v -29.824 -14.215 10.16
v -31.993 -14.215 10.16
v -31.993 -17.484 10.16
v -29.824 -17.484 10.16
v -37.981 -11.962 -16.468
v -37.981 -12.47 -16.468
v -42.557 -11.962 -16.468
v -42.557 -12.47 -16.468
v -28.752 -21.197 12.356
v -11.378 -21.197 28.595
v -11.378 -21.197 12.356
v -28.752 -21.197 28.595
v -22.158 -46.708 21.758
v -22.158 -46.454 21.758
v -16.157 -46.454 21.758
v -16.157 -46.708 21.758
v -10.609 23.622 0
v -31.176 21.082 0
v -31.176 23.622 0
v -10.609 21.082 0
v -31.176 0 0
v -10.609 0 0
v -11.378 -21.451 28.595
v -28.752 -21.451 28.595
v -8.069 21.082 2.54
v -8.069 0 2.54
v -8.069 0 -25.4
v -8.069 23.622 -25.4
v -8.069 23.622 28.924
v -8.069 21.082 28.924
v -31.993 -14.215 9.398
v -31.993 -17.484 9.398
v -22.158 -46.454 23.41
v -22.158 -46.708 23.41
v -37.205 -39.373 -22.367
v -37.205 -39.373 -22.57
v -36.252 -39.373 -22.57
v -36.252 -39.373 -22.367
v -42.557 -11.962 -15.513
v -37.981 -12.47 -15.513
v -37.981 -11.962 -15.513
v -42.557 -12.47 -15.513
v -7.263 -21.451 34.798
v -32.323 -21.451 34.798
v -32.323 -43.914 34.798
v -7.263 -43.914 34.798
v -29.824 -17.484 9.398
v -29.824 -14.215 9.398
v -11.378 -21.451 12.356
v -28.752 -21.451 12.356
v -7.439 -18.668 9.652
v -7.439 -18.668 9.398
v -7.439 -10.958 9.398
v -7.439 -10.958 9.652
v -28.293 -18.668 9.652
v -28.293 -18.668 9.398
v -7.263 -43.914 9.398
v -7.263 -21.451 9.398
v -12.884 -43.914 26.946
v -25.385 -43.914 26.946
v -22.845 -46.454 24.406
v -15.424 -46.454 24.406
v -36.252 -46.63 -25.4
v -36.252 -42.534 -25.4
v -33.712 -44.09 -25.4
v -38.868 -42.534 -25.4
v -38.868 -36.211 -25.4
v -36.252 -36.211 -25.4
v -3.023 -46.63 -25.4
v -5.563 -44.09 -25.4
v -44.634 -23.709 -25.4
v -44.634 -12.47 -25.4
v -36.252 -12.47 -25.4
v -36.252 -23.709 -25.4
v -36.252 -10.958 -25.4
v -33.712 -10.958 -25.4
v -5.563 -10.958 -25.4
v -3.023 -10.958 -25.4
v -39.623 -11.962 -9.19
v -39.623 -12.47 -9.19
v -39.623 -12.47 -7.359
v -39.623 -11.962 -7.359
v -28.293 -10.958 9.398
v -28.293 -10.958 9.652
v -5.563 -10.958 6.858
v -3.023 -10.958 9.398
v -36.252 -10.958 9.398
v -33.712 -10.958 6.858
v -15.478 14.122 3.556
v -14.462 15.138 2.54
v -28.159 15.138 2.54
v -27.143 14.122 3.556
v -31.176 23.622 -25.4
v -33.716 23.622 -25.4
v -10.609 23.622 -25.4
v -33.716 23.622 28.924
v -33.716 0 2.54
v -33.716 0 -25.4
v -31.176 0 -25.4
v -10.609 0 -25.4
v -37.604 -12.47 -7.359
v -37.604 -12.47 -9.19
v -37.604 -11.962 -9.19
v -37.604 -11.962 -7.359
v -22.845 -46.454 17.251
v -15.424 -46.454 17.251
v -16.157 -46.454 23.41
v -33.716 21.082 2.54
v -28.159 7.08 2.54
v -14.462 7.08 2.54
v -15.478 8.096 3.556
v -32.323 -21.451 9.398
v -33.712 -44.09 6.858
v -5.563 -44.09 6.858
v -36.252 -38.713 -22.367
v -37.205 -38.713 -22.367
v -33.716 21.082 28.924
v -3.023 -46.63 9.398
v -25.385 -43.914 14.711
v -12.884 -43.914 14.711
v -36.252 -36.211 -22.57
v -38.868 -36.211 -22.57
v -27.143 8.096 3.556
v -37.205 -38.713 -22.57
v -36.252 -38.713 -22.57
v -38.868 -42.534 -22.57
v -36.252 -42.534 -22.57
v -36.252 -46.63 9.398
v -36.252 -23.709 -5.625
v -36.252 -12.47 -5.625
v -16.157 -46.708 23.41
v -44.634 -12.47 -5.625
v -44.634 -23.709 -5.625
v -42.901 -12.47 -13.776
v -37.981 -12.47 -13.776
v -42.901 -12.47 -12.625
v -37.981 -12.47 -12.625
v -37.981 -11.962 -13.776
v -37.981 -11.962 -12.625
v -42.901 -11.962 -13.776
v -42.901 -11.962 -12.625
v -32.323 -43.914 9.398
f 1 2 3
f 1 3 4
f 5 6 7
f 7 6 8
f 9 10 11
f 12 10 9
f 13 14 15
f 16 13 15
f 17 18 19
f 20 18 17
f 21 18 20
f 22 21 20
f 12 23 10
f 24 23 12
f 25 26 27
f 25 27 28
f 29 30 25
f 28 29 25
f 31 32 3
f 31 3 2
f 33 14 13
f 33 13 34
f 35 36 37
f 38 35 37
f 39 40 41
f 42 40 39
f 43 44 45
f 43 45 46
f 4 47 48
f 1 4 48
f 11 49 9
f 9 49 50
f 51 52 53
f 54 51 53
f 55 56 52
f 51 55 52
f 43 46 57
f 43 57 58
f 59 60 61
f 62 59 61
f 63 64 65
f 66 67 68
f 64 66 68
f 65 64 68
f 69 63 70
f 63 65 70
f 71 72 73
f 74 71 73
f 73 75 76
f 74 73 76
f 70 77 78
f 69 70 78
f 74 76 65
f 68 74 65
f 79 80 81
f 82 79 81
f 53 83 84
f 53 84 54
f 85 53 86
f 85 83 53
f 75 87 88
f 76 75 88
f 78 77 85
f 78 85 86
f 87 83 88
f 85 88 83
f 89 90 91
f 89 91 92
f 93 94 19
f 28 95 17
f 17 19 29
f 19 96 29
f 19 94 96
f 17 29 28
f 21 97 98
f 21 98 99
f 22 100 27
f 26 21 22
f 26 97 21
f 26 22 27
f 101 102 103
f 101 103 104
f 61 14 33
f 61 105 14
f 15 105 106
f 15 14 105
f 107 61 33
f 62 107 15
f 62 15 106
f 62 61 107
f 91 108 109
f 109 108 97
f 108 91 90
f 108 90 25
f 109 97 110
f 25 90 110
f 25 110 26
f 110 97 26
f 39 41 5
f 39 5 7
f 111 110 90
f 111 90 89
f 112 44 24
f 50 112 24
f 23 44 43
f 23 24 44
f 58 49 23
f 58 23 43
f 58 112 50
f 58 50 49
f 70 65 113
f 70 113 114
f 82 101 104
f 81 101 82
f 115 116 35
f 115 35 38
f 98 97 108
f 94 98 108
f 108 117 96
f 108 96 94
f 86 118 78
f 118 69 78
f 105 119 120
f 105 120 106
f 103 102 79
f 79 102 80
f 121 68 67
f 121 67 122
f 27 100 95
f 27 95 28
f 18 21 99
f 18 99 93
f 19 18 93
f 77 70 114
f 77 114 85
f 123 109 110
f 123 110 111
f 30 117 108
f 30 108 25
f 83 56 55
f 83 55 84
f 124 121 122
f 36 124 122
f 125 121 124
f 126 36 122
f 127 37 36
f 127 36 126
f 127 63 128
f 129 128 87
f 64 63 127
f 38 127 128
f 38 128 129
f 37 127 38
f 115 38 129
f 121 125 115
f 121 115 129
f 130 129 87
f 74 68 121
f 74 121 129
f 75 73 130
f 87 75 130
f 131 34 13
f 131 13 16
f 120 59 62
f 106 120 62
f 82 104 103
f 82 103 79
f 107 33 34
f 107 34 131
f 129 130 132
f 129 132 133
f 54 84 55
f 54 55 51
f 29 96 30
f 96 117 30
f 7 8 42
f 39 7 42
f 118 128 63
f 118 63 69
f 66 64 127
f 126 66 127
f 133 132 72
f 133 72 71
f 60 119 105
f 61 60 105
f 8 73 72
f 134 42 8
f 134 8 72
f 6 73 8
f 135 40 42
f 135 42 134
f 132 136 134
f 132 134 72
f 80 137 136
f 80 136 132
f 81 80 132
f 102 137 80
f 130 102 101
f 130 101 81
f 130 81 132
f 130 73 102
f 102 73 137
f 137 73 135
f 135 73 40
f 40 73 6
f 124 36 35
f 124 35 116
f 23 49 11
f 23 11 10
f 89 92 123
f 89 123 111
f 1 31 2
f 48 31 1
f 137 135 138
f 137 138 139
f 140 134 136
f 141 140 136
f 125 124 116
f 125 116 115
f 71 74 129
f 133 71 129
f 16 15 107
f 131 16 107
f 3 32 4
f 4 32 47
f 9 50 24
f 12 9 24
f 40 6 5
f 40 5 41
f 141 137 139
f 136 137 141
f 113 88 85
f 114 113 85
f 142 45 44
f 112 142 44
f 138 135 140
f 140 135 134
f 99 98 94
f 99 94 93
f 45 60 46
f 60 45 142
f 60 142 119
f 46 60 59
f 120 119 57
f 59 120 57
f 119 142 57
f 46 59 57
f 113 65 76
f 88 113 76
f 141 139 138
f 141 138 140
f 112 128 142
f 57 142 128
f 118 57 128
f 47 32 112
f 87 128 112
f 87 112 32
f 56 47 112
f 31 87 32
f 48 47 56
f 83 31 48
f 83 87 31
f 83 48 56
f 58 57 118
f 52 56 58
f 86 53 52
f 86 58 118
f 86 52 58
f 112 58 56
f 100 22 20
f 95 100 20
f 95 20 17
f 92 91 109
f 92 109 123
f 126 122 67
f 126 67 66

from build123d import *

# Parameters (mm, degrees)
F0_W          = 25.6471270695
F0_H          = 28.9241932333
F1_DEPTH      = 23.622
F2_T          = -2.54
F3_DEPTH      = 25.4
F4_T          = 2.54
F4_T3_DEPTH   = 30.7271270695
F5_W          = 33.229653025
F5_H          = 35.672545433
F6_DEPTH      = 25.4
F7_DEPTH      = 9.398
F8_T          = -2.54
F9_W          = 25.0606182963
F9_H          = 22.4626017734
F10_DEPTH     = 25.4
F11_W         = 17.3738580197
F11_H         = 16.2390768528
F12_DEPTH     = 0.254
F13_W         = 20.8540516905
F13_H         = 7.7100452036
F14_DEPTH     = 0.254
F15_W         = 17.5806907937
F15_H         = 17.3154473305
F16_DEPTH     = 2.54
F17_T4_DEPTH  = 43.7089899514
F17_T9_DEPTH  = 30.3795969093
F17_T14_DEPTH = 43.7089899514
F17_T19_DEPTH = 30.3795969093
F18_W         = 6.000591442
F18_H         = 1.6524102539
F19_DEPTH     = 0.254
F20_W         = 2.1683480591
F20_H         = 3.2685222104
F21_DEPTH     = 0.762
F22_W         = 21.8256991357
F22_H         = 16.1863591056
F23_DEPTH     = 1.016
F24_W         = 11.2391430885
F24_H         = 19.774777656
F25_DEPTH     = 8.382
F26_W         = 2.0196139812
F26_H         = 1.8313727342
F27_DEPTH     = 0.508
F28_W         = 4.9204975367
F28_H         = 1.1510411277
F29_DEPTH     = 0.508
F30_W         = 4.5765712857
F30_H         = 0.9553717311
F31_DEPTH     = 0.508
F32_W         = 6.3235126436
F32_H         = 2.8299971759
F33_DEPTH     = 2.6162
F34_W         = 0.9528808296
F34_H         = 0.6592851132
F35_DEPTH     = 0.2032
F36_T4_DEPTH  = 47.9539982934
F36_T9_DEPTH  = 29.2505086845
F36_T14_DEPTH = 47.9539982934
F36_T19_DEPTH = 29.2505086845
F37_W         = 0.83655864
F37_H         = 0.8337534964
F38_DEPTH     = 0.508
F37_W_2       = 0.7356256247
F37_H_2       = 0.5238540471
F37_W_3       = 1.1432357132
F37_H_3       = 0.6819479167
F37_W_4       = 0.7289908826
F37_H_4       = 0.5421712995
F37_W_5       = 1.2829229236
F37_H_5       = 0.4794821143
F37_W_6       = 0.6956644356
F37_H_6       = 0.5608797073
F37_W_7       = 1.0760016739
F37_H_7       = 0.4885531962
F37_W_8       = 0.6218552589
F37_H_8       = 0.4100985825
F37_W_9       = 0.7822141051
F37_H_9       = 0.4685148597
F37_W_10      = 1.0629147291
F37_H_10      = 0.598076731
F37_W_11      = 1.1558197439
F37_H_11      = 0.371992588
F37_W_12      = 0.8621029556
F37_H_12      = 0.3762468696
F37_W_13      = 0.7478930056
F37_H_13      = 0.5268156528
F37_W_14      = 1.0761059821
F37_H_14      = 0.5310699344


# Not quite as in the source:
# - a fillet or chamfer that OpenCascade refuses, or shapes differently, is made with other operations: its cross-section is extruded or revolved along the edge and cut away or added
# - a shell that OpenCascade refuses in one call is made with other operations: the cavity is built on its own and cut out


with BuildPart() as f1:
    # F0 (on Front) → F1 (new body)
    with BuildSketch(Plane.XZ):
        with Locations((-20.8924110048, 14.4620966166)):
            Rectangle(F0_W, F0_H)
    extrude(amount=-F1_DEPTH)

    # F2
    f2_openings = [f1.faces().sort_by_distance(p)[0] for p in [
        (-33.715975, 11.811, 14.462097),
        (-20.892411, 11.811, 28.924193),
        (-20.892411, 0, 14.462097),
        (-8.068847, 11.811, 14.462097),
    ]]
    offset(amount=F2_T, openings=f2_openings)

    # F3 (add): a face of the model
    f3_faces = [f1.faces().sort_by_distance(p)[0] for p in [
        (-20.8924110048, 11.811, 0),
    ]]
    extrude(f3_faces, amount=F3_DEPTH)

    # F4: shell of thickness 2.54, made by hand


with BuildPart() as f4_core1:
    # F4_t2: copy of F1
    add(f1.part)

    # the walls: a layer under each face that stays
    f4_faces = [f4_core1.faces().sort_by_distance(p)[0] for p in [
        (-8.06884747, 11.811, 1.7620966166),
        (-20.8924110048, 10.541, 2.54),
        (-20.8924110048, 21.082, 15.7320966166),
        (-33.7159745395, 11.811, 1.7620966166),
        (-20.8924110048, 22.352, 28.9241932333),
    ]]
    thicken(f4_faces, amount=-F4_T, mode=Mode.SUBTRACT)

    # F4_s4 → F4_t3 (cut)
    with BuildSketch(Plane.YZ.offset(-36.2559745395)):
        Polygon((21.0566, 2.5654), (21.082, 0), (23.622, 0), (23.622, 2.54), align=None)
    extrude(amount=F4_T3_DEPTH, mode=Mode.SUBTRACT)


with BuildPart() as f1_1:
    add(f1.part)

    # what is left inside the walls is the cavity
    f4_cavity = [f4_core1.part.solids().sort_by_distance(p)[0] for p in [
        (-31.150575, 15.748, -12.7),
    ]]
    add(f4_cavity, mode=Mode.SUBTRACT)

    # F22 (on face) → F23 (join)
    with BuildSketch(Plane.XY.offset(2.54)):
        with Locations((-21.3105017319, 11.1090062419)):
            Rectangle(F22_W, F22_H)
    extrude(amount=F23_DEPTH)

    # F36: chamfer of 5.08 on 4 edges, made by hand


with BuildPart() as f6:
    # F5 (on Top) → F6 (new body)
    with BuildSketch(Plane.XY):
        with Locations((-19.6373554645, -28.7940166891)):
            Rectangle(F5_W, F5_H)
    extrude(amount=-F6_DEPTH)

    # F7 (add): a face of the model
    f7_faces = [f6.faces().sort_by_distance(p)[0] for p in [
        (-19.6373554645, -28.7940166891, 0),
    ]]
    extrude(f7_faces, amount=F7_DEPTH)

    # F8
    f8_openings = [f6.faces().sort_by_distance(p)[0] for p in [
        (-19.637355, -28.794017, -25.4),
        (-19.637355, -10.957744, -8.001),
    ]]
    offset(amount=F8_T, openings=f8_openings)

    # F9 (on face) → F10 (join)
    with BuildSketch(Plane.XY.offset(9.398)):
        with Locations((-19.7930010036, -32.6825478114)):
            Rectangle(F9_W, F9_H)
    extrude(amount=F10_DEPTH)

    # F11 (on face) → F12 (join)
    with BuildSketch(Plane(origin=(0, -21.4512469247, 0), x_dir=(-1, 0, 0), z_dir=(0, 1, 0))):
        with Locations((20.0650831684, 20.4758495092)):
            Rectangle(F11_W, F11_H)
    extrude(amount=F12_DEPTH)

    # F13 (on face) → F14 (join)
    with BuildSketch(Plane.XY.offset(9.398)):
        with Locations((-17.8662652615, -14.8127665743)):
            Rectangle(F13_W, F13_H)
    extrude(amount=F14_DEPTH)

    # F15 (on face) → F16 (join)
    with BuildSketch(Plane.XZ.offset(43.9138486981)):
        with Locations((-19.1343412735, 20.8285525441)):
            Rectangle(F15_W, F15_H)
    extrude(amount=F16_DEPTH)

    # F17: chamfer of 5.08 on 4 edges, made by hand


with BuildPart() as f17_tool2:
    # F17_s3 → F17_t4 (new body)
    with BuildSketch(Plane.YZ.offset(2.7201537023)):
        Polygon((-41.3738486981, 29.4862762094), (-46.4538486981, 24.4062762094), (-46.4538486981, 29.4862762094), align=None)
    extrude(amount=-F17_T4_DEPTH)

    split(bisect_by=Plane.XZ.offset(43.9138486981), keep=Keep.TOP)


with BuildPart() as f6_1:
    add(f6.part)

    # F17_t1: cut F17_tool2
    add(f17_tool2.part, mode=Mode.SUBTRACT)


with BuildPart() as f17_tool7:
    # F17_s8 → F17_t9 (new body)
    with BuildSketch(Plane.XY.offset(42.5504257882)):
        Polygon((-27.9246866703, -41.3738486981), (-22.8446866703, -46.4538486981), (-27.9246866703, -46.4538486981), align=None)
    extrude(amount=-F17_T9_DEPTH)

    split(bisect_by=Plane.XZ.offset(43.9138486981), keep=Keep.TOP)


with BuildPart() as f6_2:
    add(f6_1.part)

    # F17_t6: cut F17_tool7
    add(f17_tool7.part, mode=Mode.SUBTRACT)


with BuildPart() as f17_tool12:
    # F17_s13 → F17_t14 (new body)
    with BuildSketch(Plane.YZ.offset(-40.9888362492)):
        Polygon((-41.3738486981, 12.1708288789), (-46.4538486981, 17.2508288789), (-46.4538486981, 12.1708288789), align=None)
    extrude(amount=F17_T14_DEPTH)

    split(bisect_by=Plane.XZ.offset(43.9138486981), keep=Keep.TOP)


with BuildPart() as f6_3:
    add(f6_2.part)

    # F17_t11: cut F17_tool12
    add(f17_tool12.part, mode=Mode.SUBTRACT)


with BuildPart() as f17_tool17:
    # F17_s18 → F17_t19 (new body)
    with BuildSketch(Plane.XY.offset(12.1708288789)):
        Polygon((-10.3439958766, -41.3738486981), (-15.4239958766, -46.4538486981), (-10.3439958766, -46.4538486981), align=None)
    extrude(amount=F17_T19_DEPTH)

    split(bisect_by=Plane.XZ.offset(43.9138486981), keep=Keep.TOP)


with BuildPart() as f6_4:
    add(f6_3.part)

    # F17_t16: cut F17_tool17
    add(f17_tool17.part, mode=Mode.SUBTRACT)

    # F18 (on face) → F19 (join)
    with BuildSketch(Plane.XZ.offset(46.4538486981)):
        with Locations((-19.1577738151, 22.5839214399)):
            Rectangle(F18_W, F18_H)
    extrude(amount=F19_DEPTH)

    # F20 (on face) → F21 (join)
    with BuildSketch(Plane.XY.offset(9.398)):
        with Locations((-30.9085892513, -15.8493197523)):
            Rectangle(F20_W, F20_H)
    extrude(amount=F21_DEPTH)

    # F24 (on face) → F25 (join)
    with BuildSketch(Plane(origin=(-36.252181977, 0, 0), x_dir=(0, -1, 0), z_dir=(-1, 0, 0))):
        with Locations((18.089174293, -15.512611172)):
            Rectangle(F24_W, F24_H)
    extrude(amount=F25_DEPTH)

    # F26 (on face) → F27 (join)
    with BuildSketch(Plane(origin=(0, -12.4696027488, 0), x_dir=(-1, 0, 0), z_dir=(0, 1, 0))):
        with Locations((38.6133119464, -8.2744567189)):
            Rectangle(F26_W, F26_H)
    extrude(amount=F27_DEPTH)

    # F28 (on face) → F29 (join)
    with BuildSketch(Plane(origin=(0, -12.4696027488, 0), x_dir=(-1, 0, 0), z_dir=(0, 1, 0))):
        with Locations((40.4411107302, -13.2004530169)):
            Rectangle(F28_W, F28_H)
    extrude(amount=F29_DEPTH)

    # F30 (on face) → F31 (join)
    with BuildSketch(Plane(origin=(0, -12.4696027488, 0), x_dir=(-1, 0, 0), z_dir=(0, 1, 0))):
        with Locations((40.2691476047, -15.9902970375)):
            Rectangle(F30_W, F30_H)
    extrude(amount=F31_DEPTH)

    # F32 (on face) → F33 (join)
    with BuildSketch(Plane(origin=(-36.252181977, 0, 0), x_dir=(0, -1, 0), z_dir=(-1, 0, 0))):
        with Locations((39.3726844341, -23.985001412)):
            Rectangle(F32_W, F32_H)
    extrude(amount=F33_DEPTH)

    # F34 (on face) → F35 (join)
    with BuildSketch(Plane.XY.offset(-22.5700028241)):
        with Locations((-36.7286223918, -39.0430418774)):
            Rectangle(F34_W, F34_H)
    extrude(amount=F35_DEPTH)


with BuildPart() as f36_tool2:
    # F36_s3 → F36_t4 (new body)
    with BuildSketch(Plane.YZ.offset(2.6664974148)):
        Polygon((19.2021857947, -1.524), (14.1221857947, 3.556), (19.2021857947, 3.556), align=None)
    extrude(amount=-F36_T4_DEPTH)

    split(bisect_by=Plane.XY.offset(2.54), keep=Keep.TOP)


with BuildPart() as f1_2:
    add(f1_1.part)

    # F36_t1: cut F36_tool2
    add(f36_tool2.part, mode=Mode.SUBTRACT)


with BuildPart() as f36_tool7:
    # F36_s8 → F36_t9 (new body)
    with BuildSketch(Plane.XZ.offset(-19.2021857947)):
        Polygon((-32.2233512998, -1.524), (-27.1433512998, 3.556), (-32.2233512998, 3.556), align=None)
    extrude(amount=F36_T9_DEPTH)

    split(bisect_by=Plane.XY.offset(2.54), keep=Keep.TOP)


with BuildPart() as f1_3:
    add(f1_2.part)

    # F36_t6: cut F36_tool7
    add(f36_tool7.part, mode=Mode.SUBTRACT)


with BuildPart() as f36_tool12:
    # F36_s13 → F36_t14 (new body)
    with BuildSketch(Plane.YZ.offset(-45.2875008786)):
        Polygon((3.0158266891, -1.524), (8.0958266891, 3.556), (3.0158266891, 3.556), align=None)
    extrude(amount=F36_T14_DEPTH)

    split(bisect_by=Plane.XY.offset(2.54), keep=Keep.TOP)


with BuildPart() as f1_4:
    add(f1_3.part)

    # F36_t11: cut F36_tool12
    add(f36_tool12.part, mode=Mode.SUBTRACT)


with BuildPart() as f36_tool17:
    # F36_s18 → F36_t19 (new body)
    with BuildSketch(Plane.XZ.offset(10.0483228898)):
        Polygon((-10.3976521641, -1.524), (-15.4776521641, 3.556), (-10.3976521641, 3.556), align=None)
    extrude(amount=-F36_T19_DEPTH)

    split(bisect_by=Plane.XY.offset(2.54), keep=Keep.TOP)


with BuildPart() as f1_5:
    add(f1_4.part)

    # F36_t16: cut F36_tool17
    add(f36_tool17.part, mode=Mode.SUBTRACT)


with BuildPart() as f38:
    # F37 (on Top) → F38 (new body)
    with BuildSketch(Plane.XY):
        Polygon((-47.7759763598, -38.6007763445), (-47.7759763598, -38.0017347634), (-48.7721376121, -38.0017347634), (-48.7721376121, -38.6007763445), (-48.6606992781, -38.6007763445), (-47.8241406381, -38.6007763445), align=None)
        with Locations((-48.2424199581, -39.0176530927)):
            Rectangle(F37_W, F37_H)
    extrude(amount=F38_DEPTH)


with BuildPart() as f38b:
    # F37 (on Top) → F38, piece 2 (new body)
    with BuildSketch(Plane.XY):
        with Locations((-47.1070185304, -37.4404694885)):
            Rectangle(F37_W_2, F37_H_2)
    extrude(amount=F38_DEPTH)


with BuildPart() as f38c:
    # F37 (on Top) → F38, piece 3 (new body)
    with BuildSketch(Plane.XY):
        with Locations((-48.2318531722, -37.4272111803)):
            Rectangle(F37_W_3, F37_H_3)
    extrude(amount=F38_DEPTH)


with BuildPart() as f38d:
    # F37 (on Top) → F38, piece 4 (new body)
    with BuildSketch(Plane.XY):
        with Locations((-47.1084099263, -36.6477929056)):
            Rectangle(F37_W_4, F37_H_4)
    extrude(amount=F38_DEPTH)


with BuildPart() as f38e:
    # F37 (on Top) → F38, piece 5 (new body)
    with BuildSketch(Plane.XY):
        with Locations((-48.2132434845, -36.6469696164)):
            Rectangle(F37_W_5, F37_H_5)
    extrude(amount=F38_DEPTH)


with BuildPart() as f38f:
    # F37 (on Top) → F38, piece 6 (new body)
    with BuildSketch(Plane.XY):
        with Locations((-47.1567194909, -35.9333977103)):
            Rectangle(F37_W_6, F37_H_6)
    extrude(amount=F38_DEPTH)


with BuildPart() as f38g:
    # F37 (on Top) → F38, piece 7 (new body)
    with BuildSketch(Plane.XY):
        with Locations((-48.3284760267, -35.9984207898)):
            Rectangle(F37_W_7, F37_H_7)
    extrude(amount=F38_DEPTH)


with BuildPart() as f38h:
    # F37 (on Top) → F38, piece 8 (new body)
    with BuildSketch(Plane.XY):
        with Locations((-47.1879057586, -39.1126889735)):
            Rectangle(F37_W_8, F37_H_8)
    extrude(amount=F38_DEPTH)


with BuildPart() as f38i:
    # F37 (on Top) → F38, piece 9 (new body)
    with BuildSketch(Plane.XY):
        with Locations((-47.2700297832, -39.9314910173)):
            Rectangle(F37_W_9, F37_H_9)
    extrude(amount=F38_DEPTH)


with BuildPart() as f38j:
    # F37 (on Top) → F38, piece 10 (new body)
    with BuildSketch(Plane.XY):
        with Locations((-48.4051033854, -40.0122273713)):
            Rectangle(F37_W_10, F37_H_10)
    extrude(amount=F38_DEPTH)


with BuildPart() as f38k:
    # F37 (on Top) → F38, piece 11 (new body)
    with BuildSketch(Plane.XY):
        with Locations((-47.4454332143, -40.679089725)):
            Rectangle(F37_W_11, F37_H_11)
    extrude(amount=F38_DEPTH)


with BuildPart() as f38l:
    # F37 (on Top) → F38, piece 12 (new body)
    with BuildSketch(Plane.XY):
        with Locations((-48.5138017684, -40.779016912)):
            Rectangle(F37_W_12, F37_H_12)
    extrude(amount=F38_DEPTH)


with BuildPart() as f38m:
    # F37 (on Top) → F38, piece 13 (new body)
    with BuildSketch(Plane.XY):
        with Locations((-47.1978355199, -41.4876379073)):
            Rectangle(F37_W_13, F37_H_13)
    extrude(amount=F38_DEPTH)


with BuildPart() as f38n:
    # F37 (on Top) → F38, piece 14 (new body)
    with BuildSketch(Plane.XY):
        with Locations((-48.5091153532, -41.5869280696)):
            Rectangle(F37_W_14, F37_H_14)
    extrude(amount=F38_DEPTH)


solid = Compound([f6_4.part, f1_5.part])
